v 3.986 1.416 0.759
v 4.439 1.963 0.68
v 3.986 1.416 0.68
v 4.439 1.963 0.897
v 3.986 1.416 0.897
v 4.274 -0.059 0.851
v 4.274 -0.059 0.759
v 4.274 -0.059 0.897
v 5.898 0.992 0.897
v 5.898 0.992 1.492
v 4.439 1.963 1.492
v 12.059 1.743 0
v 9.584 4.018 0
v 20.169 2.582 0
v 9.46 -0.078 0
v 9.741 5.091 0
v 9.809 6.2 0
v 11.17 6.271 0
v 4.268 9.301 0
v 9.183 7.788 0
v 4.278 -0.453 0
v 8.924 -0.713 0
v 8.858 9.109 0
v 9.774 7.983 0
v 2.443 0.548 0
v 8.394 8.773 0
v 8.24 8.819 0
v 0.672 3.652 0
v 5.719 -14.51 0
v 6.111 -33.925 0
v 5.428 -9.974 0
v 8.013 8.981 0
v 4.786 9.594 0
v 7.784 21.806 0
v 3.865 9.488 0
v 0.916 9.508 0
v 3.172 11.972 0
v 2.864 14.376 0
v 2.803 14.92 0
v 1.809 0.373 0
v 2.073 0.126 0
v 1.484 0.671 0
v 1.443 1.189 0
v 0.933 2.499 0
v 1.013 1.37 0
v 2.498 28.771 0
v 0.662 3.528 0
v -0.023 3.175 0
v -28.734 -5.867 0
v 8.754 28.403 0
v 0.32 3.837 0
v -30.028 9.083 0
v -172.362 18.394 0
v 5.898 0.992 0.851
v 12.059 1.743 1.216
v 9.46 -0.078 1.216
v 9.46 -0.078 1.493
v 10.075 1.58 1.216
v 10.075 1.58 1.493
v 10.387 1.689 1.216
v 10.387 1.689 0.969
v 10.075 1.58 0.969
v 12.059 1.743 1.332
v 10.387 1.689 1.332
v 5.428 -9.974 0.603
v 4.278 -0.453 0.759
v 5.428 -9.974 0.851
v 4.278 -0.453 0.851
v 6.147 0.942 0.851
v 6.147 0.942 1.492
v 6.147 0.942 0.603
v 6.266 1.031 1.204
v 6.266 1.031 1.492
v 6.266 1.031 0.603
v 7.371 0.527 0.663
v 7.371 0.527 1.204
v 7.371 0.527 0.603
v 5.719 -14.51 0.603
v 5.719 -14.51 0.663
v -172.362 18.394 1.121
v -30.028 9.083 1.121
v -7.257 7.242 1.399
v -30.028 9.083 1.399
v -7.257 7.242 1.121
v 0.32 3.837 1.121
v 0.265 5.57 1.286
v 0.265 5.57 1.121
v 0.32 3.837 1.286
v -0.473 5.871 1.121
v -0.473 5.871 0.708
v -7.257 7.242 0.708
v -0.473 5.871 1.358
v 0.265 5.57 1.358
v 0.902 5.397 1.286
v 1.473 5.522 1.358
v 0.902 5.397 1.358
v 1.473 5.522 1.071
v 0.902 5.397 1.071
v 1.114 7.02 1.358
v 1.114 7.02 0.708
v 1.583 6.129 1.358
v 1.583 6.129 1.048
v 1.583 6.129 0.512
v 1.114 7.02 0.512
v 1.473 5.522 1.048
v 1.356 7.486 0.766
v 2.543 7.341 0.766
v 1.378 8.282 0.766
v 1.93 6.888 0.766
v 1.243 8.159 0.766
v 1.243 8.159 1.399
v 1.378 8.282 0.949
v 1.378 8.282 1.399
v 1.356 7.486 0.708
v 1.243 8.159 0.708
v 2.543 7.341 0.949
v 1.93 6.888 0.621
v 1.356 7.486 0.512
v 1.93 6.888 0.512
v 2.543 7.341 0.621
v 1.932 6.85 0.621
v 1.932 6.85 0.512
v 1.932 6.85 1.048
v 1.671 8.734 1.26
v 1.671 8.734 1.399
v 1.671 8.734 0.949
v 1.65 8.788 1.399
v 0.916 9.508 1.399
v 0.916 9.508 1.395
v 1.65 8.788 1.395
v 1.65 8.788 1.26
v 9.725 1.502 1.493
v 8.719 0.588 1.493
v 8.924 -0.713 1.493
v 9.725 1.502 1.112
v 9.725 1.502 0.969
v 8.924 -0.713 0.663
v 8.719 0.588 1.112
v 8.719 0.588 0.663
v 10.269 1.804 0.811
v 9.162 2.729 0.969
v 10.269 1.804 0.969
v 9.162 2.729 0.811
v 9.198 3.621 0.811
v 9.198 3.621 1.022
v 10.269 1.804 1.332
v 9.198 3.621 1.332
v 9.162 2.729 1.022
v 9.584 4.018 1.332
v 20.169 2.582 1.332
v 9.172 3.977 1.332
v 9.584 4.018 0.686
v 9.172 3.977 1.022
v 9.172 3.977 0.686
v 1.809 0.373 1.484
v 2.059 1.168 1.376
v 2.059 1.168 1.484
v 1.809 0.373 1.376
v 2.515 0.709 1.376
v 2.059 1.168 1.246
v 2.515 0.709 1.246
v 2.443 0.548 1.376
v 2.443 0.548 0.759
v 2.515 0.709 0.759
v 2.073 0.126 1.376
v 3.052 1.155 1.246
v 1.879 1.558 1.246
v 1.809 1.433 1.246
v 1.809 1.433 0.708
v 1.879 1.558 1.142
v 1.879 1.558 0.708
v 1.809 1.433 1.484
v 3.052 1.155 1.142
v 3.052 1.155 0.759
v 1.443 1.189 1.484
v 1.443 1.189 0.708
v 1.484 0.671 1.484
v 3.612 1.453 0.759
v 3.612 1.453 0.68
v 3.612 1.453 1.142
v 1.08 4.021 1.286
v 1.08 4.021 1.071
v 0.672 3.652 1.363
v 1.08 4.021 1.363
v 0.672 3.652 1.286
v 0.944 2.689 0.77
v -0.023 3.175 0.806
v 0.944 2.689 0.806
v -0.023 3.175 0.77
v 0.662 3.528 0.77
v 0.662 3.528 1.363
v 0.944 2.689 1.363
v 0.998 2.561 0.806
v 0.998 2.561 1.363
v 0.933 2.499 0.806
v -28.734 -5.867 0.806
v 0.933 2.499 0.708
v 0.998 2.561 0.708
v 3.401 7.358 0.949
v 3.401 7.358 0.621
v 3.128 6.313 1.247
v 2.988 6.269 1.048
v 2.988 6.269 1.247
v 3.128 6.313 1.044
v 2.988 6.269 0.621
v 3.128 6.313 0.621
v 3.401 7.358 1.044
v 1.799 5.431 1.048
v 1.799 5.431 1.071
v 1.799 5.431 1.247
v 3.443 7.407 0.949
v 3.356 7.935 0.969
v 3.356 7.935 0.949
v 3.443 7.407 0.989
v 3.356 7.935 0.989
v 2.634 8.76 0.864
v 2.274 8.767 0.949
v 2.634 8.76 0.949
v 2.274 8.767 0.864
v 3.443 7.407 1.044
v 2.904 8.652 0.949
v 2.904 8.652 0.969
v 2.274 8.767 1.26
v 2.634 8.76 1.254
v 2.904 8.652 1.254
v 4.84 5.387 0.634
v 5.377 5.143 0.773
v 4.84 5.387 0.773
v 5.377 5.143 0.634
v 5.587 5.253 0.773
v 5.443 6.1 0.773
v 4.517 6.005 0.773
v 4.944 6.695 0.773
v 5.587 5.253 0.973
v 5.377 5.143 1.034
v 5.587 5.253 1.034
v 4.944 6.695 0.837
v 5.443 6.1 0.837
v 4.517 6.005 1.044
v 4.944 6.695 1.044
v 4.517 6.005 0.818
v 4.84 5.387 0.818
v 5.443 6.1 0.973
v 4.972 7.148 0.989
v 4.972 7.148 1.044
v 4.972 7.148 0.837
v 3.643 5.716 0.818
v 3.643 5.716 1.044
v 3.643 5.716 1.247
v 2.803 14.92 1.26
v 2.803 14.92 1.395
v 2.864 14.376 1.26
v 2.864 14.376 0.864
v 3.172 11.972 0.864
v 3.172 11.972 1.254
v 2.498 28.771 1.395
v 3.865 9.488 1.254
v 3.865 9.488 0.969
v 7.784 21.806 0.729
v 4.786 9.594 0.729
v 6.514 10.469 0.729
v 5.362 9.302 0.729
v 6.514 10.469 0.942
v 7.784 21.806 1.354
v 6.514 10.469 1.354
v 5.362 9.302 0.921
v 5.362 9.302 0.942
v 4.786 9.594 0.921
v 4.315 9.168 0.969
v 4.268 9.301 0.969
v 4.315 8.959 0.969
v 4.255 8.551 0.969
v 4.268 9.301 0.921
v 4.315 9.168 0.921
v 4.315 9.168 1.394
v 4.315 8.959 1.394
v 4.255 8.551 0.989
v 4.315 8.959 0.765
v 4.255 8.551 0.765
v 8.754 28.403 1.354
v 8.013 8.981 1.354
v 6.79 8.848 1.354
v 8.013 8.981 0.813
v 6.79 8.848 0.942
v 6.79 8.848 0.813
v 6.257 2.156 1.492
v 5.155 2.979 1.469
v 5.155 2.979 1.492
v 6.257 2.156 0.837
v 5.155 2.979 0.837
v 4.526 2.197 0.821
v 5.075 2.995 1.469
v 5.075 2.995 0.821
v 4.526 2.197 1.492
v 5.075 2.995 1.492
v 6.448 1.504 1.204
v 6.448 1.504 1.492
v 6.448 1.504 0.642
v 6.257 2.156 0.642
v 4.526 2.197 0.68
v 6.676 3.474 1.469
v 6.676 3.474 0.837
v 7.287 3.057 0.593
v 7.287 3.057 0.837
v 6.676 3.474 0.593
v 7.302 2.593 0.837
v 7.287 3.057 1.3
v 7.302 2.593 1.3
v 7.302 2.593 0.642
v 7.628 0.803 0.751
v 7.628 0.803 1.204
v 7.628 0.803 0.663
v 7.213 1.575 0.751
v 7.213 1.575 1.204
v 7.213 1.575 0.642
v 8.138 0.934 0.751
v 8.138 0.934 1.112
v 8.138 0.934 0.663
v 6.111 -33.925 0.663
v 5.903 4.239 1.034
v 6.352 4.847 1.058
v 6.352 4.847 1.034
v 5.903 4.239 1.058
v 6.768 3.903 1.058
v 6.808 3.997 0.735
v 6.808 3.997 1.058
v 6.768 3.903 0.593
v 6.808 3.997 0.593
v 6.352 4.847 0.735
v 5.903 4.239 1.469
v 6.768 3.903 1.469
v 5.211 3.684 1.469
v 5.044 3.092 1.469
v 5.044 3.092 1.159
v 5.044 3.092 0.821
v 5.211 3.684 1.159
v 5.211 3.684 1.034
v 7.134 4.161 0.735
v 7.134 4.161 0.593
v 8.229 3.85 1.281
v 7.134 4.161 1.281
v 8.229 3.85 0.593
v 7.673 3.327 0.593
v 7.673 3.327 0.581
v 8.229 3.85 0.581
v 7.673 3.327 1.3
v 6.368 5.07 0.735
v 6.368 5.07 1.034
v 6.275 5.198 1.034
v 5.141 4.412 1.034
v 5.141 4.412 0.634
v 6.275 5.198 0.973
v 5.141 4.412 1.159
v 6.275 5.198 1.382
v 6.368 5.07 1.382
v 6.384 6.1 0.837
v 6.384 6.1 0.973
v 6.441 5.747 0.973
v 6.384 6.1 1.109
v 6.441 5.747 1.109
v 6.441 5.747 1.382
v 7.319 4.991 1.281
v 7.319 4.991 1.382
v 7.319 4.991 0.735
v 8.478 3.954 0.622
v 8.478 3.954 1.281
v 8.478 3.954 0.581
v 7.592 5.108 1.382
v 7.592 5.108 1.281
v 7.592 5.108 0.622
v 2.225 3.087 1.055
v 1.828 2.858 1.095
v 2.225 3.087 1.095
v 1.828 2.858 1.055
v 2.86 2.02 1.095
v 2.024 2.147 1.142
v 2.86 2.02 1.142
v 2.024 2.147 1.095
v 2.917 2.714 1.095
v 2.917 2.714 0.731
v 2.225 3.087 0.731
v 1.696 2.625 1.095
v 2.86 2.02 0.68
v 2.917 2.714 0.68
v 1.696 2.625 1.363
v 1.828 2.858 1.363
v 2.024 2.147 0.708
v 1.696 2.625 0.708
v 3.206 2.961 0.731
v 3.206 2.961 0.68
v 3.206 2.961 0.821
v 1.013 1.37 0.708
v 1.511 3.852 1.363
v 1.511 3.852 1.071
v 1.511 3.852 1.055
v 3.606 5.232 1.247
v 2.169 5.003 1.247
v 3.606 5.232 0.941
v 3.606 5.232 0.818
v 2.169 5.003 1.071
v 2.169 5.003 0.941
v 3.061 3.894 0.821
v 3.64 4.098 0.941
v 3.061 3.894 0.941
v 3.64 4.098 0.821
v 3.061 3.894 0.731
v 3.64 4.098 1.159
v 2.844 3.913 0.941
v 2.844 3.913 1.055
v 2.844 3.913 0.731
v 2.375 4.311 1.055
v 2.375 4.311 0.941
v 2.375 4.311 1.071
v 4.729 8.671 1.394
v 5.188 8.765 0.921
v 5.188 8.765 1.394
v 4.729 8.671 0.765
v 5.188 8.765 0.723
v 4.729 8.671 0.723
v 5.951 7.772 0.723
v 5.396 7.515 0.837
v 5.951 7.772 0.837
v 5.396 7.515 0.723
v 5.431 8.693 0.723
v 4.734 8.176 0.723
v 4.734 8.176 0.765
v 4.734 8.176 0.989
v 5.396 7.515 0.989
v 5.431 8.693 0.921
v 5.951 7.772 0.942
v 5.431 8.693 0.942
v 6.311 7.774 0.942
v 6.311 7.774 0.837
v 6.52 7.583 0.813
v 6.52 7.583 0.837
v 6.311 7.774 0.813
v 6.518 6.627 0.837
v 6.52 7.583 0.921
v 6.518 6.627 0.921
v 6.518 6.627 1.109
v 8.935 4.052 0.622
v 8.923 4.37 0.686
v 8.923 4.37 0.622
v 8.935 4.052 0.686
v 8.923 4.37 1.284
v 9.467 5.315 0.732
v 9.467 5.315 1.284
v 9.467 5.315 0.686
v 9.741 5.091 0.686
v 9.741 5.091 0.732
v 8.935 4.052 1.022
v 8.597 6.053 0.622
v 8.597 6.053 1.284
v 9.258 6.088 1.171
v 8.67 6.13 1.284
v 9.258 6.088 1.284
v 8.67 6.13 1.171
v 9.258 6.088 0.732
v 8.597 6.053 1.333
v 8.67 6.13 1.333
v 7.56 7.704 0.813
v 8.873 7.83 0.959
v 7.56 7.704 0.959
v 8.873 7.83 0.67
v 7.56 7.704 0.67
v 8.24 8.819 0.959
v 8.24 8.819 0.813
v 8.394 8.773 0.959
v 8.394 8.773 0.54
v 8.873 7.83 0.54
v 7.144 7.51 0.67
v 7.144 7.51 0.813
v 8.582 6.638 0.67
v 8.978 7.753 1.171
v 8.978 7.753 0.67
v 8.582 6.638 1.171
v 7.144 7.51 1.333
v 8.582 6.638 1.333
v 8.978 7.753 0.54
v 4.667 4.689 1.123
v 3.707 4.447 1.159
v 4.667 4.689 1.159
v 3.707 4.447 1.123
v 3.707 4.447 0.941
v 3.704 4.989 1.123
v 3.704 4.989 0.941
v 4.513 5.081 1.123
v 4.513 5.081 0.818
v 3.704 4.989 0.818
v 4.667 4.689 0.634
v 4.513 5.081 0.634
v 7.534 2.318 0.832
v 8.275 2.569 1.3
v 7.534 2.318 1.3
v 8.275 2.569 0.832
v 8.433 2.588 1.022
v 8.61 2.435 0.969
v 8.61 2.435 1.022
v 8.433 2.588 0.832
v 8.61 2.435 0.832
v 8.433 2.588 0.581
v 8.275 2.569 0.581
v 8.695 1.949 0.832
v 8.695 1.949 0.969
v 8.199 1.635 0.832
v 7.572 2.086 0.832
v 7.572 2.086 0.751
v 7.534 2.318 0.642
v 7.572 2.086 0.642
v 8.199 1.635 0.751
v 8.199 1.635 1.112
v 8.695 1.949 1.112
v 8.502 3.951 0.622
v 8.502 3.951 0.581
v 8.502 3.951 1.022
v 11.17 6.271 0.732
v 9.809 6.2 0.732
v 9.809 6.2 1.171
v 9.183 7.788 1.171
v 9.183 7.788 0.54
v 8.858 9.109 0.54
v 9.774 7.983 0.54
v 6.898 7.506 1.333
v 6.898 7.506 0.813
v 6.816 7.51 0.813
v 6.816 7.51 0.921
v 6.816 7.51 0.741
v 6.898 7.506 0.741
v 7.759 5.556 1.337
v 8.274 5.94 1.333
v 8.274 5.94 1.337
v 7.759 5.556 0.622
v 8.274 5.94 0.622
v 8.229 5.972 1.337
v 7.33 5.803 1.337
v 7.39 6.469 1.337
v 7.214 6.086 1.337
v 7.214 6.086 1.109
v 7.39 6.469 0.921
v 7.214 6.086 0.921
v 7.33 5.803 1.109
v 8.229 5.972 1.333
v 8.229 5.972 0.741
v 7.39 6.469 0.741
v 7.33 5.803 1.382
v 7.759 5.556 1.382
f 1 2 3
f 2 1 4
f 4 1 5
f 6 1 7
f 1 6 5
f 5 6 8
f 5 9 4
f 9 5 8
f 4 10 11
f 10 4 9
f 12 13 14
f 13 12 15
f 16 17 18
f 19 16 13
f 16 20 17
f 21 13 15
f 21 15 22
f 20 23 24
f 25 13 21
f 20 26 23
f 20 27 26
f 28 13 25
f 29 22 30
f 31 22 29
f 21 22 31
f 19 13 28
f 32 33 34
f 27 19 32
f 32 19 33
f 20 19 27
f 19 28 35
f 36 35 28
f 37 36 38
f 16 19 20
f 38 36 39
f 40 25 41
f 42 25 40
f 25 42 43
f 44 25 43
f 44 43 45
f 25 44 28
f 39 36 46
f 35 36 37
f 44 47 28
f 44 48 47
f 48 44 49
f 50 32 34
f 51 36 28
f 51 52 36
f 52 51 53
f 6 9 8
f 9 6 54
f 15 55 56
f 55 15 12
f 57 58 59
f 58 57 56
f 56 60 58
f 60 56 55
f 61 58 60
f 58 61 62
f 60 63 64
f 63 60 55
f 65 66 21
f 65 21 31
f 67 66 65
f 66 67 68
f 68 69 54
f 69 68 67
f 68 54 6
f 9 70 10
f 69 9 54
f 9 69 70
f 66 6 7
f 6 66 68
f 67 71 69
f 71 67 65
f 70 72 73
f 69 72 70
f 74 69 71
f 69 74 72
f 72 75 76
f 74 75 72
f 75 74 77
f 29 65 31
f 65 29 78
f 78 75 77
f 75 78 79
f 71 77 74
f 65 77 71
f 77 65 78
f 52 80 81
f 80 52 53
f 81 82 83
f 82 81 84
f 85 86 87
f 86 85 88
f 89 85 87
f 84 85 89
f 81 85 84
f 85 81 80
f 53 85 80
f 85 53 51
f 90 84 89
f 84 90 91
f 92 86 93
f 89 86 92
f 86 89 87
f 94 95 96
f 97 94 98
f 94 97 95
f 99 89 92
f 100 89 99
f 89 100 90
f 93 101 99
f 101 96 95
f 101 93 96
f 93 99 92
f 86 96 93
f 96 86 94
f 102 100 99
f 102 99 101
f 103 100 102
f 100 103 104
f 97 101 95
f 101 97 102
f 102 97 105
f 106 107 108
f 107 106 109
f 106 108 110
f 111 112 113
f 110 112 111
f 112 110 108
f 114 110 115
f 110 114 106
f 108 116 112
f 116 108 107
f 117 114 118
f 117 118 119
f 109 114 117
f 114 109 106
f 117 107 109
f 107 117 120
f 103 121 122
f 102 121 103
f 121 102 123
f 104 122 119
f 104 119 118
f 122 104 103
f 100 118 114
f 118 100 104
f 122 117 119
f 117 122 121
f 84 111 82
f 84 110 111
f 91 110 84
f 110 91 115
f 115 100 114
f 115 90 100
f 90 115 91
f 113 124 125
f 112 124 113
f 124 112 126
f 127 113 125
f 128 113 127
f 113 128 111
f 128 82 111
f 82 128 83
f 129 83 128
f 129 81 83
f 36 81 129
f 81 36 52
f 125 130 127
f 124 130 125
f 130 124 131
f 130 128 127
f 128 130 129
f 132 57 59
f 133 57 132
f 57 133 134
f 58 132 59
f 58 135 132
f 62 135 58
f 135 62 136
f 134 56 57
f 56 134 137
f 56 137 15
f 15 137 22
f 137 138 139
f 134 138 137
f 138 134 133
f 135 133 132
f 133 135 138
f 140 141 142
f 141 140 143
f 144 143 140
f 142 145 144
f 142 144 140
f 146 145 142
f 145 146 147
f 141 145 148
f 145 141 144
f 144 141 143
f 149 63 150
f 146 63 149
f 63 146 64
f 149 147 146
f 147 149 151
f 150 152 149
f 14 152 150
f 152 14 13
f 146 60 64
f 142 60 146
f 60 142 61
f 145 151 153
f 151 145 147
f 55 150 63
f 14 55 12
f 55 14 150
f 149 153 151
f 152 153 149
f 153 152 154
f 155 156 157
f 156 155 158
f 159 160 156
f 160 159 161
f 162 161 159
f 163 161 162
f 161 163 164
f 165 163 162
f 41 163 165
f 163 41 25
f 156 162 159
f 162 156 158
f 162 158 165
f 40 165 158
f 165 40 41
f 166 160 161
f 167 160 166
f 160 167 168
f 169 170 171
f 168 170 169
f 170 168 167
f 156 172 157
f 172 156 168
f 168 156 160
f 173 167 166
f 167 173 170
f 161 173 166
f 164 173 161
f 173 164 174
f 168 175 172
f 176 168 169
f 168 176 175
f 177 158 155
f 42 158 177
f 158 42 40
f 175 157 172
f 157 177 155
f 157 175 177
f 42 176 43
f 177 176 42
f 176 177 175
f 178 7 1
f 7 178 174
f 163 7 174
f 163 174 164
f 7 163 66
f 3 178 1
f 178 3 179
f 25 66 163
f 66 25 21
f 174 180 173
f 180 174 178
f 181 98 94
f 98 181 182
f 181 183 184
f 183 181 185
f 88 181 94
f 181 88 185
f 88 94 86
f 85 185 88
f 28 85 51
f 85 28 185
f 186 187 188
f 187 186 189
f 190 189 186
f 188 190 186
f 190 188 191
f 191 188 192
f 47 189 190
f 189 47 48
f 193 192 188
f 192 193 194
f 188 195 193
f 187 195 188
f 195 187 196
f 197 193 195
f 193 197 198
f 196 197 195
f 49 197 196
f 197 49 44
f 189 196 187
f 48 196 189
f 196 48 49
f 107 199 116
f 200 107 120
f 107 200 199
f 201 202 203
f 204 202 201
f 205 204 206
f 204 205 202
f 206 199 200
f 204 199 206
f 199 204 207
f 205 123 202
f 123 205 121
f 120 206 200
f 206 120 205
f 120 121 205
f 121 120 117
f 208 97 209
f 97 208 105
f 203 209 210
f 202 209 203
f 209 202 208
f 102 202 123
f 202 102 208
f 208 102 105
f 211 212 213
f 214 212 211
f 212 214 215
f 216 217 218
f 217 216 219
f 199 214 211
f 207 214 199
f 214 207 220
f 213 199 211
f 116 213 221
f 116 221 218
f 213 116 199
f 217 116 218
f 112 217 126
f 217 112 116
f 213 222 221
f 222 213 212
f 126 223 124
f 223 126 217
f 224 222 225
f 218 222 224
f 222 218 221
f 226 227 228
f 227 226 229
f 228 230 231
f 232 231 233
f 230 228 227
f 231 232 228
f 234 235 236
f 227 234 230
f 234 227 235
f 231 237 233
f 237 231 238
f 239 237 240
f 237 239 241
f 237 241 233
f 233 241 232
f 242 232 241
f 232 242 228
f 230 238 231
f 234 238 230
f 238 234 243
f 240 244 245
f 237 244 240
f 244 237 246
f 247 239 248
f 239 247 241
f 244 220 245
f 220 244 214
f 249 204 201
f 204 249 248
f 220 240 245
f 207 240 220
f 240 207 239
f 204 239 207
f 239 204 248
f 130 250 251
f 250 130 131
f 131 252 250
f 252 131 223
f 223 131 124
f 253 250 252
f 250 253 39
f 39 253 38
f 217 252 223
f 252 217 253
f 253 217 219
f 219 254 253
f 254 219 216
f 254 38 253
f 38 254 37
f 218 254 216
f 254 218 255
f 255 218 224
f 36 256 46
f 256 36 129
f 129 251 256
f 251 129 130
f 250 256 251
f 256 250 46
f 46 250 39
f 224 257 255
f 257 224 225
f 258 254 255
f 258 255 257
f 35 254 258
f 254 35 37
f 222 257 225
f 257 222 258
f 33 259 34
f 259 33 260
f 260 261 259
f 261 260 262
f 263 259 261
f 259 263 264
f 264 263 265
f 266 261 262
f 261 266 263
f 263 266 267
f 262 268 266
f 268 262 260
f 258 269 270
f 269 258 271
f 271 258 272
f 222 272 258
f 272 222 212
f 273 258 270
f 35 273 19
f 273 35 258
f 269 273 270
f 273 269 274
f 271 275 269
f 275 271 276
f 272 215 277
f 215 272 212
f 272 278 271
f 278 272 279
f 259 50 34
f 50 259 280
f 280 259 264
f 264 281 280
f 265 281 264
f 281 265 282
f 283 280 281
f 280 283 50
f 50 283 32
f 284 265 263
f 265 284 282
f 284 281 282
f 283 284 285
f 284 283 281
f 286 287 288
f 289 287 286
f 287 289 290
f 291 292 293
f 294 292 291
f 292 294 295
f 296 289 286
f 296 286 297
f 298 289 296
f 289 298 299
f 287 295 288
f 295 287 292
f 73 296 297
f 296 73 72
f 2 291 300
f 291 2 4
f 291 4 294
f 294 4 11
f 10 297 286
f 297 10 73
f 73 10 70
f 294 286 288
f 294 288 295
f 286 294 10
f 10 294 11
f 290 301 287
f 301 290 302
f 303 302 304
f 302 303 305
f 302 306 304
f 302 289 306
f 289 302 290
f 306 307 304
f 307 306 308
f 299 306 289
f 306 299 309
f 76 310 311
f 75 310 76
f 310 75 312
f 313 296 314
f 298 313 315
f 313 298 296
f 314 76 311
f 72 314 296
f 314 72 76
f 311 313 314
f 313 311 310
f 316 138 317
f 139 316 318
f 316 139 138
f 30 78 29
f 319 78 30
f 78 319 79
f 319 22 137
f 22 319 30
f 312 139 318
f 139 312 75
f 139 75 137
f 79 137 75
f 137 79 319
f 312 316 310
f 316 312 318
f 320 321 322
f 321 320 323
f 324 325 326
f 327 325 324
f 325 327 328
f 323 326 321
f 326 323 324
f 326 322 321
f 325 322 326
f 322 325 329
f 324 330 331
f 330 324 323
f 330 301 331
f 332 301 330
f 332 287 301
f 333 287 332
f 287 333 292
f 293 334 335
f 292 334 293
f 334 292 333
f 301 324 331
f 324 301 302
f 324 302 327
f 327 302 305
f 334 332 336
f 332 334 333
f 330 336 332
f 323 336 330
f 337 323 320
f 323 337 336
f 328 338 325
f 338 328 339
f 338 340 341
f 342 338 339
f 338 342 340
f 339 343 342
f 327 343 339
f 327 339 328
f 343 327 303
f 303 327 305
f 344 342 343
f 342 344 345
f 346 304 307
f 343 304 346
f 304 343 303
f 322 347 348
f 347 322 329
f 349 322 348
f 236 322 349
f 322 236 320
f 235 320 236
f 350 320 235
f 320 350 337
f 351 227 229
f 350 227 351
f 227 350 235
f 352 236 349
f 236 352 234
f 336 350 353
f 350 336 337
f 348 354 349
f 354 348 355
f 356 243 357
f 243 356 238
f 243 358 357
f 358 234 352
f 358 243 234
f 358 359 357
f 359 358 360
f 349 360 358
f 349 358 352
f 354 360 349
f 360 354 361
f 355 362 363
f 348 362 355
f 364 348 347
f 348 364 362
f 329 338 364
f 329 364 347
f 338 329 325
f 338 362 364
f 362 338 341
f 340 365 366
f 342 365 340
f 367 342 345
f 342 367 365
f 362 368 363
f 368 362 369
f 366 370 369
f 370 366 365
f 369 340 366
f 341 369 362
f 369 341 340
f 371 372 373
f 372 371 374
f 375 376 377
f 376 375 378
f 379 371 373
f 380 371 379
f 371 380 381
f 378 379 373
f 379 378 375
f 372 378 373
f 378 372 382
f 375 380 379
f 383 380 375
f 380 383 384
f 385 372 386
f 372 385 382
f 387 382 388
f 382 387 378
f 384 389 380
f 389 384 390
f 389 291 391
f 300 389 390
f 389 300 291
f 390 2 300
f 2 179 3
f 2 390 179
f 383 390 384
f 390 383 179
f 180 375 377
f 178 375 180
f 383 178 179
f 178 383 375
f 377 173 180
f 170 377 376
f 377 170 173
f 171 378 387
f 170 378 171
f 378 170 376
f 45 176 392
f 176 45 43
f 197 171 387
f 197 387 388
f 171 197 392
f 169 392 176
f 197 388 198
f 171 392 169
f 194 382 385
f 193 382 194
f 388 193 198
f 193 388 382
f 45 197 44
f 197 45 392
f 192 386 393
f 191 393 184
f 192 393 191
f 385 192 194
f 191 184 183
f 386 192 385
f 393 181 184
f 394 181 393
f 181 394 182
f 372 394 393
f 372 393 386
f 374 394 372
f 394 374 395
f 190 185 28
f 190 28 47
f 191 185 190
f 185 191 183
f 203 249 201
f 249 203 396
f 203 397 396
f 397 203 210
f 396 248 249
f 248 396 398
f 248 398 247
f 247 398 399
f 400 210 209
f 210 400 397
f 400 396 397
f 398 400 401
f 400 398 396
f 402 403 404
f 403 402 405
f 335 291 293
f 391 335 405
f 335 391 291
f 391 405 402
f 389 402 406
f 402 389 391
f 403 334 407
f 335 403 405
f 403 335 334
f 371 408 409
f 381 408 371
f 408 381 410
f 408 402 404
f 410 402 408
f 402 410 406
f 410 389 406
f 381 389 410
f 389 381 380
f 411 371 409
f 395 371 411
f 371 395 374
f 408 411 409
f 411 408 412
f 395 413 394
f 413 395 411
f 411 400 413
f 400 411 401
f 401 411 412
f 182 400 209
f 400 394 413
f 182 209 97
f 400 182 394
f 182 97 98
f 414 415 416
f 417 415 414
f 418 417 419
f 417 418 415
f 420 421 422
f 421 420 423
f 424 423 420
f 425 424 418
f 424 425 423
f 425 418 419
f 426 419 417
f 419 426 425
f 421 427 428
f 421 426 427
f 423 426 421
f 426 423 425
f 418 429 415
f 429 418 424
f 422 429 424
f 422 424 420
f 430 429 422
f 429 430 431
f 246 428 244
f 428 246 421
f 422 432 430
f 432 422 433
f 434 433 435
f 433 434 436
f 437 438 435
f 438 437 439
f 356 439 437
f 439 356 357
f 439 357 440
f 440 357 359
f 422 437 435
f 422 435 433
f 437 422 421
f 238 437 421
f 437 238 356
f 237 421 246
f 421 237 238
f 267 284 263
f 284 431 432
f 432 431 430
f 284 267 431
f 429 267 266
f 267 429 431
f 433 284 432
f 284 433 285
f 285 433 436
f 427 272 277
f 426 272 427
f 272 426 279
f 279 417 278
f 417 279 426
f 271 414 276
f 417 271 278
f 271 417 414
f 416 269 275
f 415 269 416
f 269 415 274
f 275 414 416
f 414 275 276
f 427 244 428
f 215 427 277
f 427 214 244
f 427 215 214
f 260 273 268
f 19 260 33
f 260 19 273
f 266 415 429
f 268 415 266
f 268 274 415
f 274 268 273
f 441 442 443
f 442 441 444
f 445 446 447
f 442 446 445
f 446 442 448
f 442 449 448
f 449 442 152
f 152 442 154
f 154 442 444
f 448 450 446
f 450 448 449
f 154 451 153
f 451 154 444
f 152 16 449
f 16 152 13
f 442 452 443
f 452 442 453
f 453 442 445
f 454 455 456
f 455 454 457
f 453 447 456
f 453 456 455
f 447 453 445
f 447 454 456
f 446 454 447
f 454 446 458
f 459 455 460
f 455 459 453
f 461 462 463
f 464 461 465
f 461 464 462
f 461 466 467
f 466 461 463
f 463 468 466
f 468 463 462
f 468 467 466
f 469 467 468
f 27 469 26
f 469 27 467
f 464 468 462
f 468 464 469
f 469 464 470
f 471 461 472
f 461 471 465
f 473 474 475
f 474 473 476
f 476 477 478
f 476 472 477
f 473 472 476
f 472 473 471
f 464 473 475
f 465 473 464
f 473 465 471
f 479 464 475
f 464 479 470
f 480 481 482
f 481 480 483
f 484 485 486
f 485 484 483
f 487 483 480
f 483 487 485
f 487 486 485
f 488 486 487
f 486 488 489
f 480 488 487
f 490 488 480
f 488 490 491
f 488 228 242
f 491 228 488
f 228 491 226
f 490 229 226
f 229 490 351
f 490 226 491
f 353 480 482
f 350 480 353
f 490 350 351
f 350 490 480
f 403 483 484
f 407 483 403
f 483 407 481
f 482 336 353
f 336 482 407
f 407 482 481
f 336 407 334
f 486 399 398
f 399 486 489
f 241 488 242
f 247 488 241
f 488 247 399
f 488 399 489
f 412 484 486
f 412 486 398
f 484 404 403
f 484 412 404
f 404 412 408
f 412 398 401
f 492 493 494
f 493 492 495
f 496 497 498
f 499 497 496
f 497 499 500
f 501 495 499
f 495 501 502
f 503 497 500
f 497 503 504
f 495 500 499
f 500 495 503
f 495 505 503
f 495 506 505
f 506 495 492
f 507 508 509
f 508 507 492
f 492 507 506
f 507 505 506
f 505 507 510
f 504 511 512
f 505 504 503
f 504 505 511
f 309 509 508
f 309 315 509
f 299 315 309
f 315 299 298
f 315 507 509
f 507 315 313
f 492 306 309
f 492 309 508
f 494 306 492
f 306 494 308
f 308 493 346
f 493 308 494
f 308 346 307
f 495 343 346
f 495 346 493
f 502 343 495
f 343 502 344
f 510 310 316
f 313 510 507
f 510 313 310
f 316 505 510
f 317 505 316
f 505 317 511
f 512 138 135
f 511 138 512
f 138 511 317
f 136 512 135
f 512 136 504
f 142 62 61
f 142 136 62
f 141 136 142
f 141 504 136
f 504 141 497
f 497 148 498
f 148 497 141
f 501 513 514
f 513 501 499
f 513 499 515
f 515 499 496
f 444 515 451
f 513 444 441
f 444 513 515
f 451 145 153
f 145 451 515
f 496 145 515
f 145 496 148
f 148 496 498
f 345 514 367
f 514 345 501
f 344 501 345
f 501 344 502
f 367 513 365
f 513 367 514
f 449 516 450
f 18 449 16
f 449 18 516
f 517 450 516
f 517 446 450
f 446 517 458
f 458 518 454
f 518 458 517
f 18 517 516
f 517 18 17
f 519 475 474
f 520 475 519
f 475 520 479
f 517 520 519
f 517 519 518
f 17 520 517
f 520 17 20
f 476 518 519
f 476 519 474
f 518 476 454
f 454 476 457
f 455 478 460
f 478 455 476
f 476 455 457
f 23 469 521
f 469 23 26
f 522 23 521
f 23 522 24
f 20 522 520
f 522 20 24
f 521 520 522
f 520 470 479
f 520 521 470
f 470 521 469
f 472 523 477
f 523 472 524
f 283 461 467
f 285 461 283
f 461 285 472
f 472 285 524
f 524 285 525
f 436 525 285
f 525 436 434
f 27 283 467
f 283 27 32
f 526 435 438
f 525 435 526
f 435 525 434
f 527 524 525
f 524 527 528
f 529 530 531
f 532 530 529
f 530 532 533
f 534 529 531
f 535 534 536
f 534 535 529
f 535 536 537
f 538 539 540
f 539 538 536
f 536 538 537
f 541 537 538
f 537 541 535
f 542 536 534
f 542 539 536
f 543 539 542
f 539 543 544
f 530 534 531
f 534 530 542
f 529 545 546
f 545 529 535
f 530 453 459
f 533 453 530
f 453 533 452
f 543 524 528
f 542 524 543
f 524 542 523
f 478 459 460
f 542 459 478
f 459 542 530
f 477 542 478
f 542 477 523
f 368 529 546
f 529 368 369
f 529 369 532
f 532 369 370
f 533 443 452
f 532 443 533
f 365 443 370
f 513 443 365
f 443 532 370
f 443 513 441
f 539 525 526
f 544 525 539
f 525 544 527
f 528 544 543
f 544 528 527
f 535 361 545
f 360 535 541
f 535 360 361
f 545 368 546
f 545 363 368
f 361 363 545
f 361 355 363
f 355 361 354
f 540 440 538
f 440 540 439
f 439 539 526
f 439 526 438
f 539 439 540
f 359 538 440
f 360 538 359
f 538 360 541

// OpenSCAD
union() {
	linear_extrude(height = 0.8968151095) {
		polygon(points = [[3.985586373024085, 1.4163151264697034], [4.274279786508919, -0.058723176604262683], [5.8983752412357555, 0.9915415721388465], [4.438714341742451, 1.9626676269784178]]);
	}
	linear_extrude(height = 1.2155783643) {
		polygon(points = [[10.07504885882976, 1.5802160185728964], [9.459696021651917, -0.07798118572829077], [12.05920443111194, 1.7427390520267876], [10.38734496603068, 1.6892251850085935]]);
	}
	linear_extrude(height = 0.8508772328) {
		polygon(points = [[5.427728754618061, -9.97374363284219], [6.147492825484421, 0.9422705349368847], [5.8983752412357555, 0.9915415721388465], [4.274279786508919, -0.058723176604262683], [4.278100418286609, -0.4529141704763394]]);
	}
	linear_extrude(height = 0.6027336539) {
		polygon(points = [[5.718782145155748, -14.510452668979248], [7.370952987486774, 0.5270723837673056], [6.265765366333088, 1.0312484341898904], [6.147492825484421, 0.9422705349368847], [5.427728754618061, -9.97374363284219]]);
	}
	linear_extrude(height = 1.1205449402) {
		polygon(points = [[0.31971272393050154, 3.8370299792580944], [-172.3616164803935, 18.394092220168172], [-30.028162021194234, 9.082612951598495], [-7.256982238586573, 7.241663410220105], [-0.4725998384002328, 5.871143758927959], [0.265324506229122, 5.5701153754826285]]);
	}
	linear_extrude(height = 1.3583904662) {
		polygon(points = [[1.5833853917610652, 6.128834192047368], [1.1144483270527592, 7.020440226254804], [-0.4725998384002328, 5.871143758927959], [0.265324506229122, 5.5701153754826285], [0.9022947541965005, 5.396696343107139], [1.4732533312350222, 5.522351645089202]]);
	}
	linear_extrude(height = 0.7663050325) {
		polygon(points = [[1.3780773073333483, 8.28202758125457], [2.5431925395294344, 7.340818093658286], [1.9296131434283663, 6.888058073493114], [1.3556152153688932, 7.486383313531218], [1.243266905852212, 8.158869924753068]]);
	}
	linear_extrude(height = 0.5121932068) {
		polygon(points = [[1.3556152153688932, 7.486383313531218], [1.1144483270527592, 7.020440226254804], [1.5833853917610652, 6.128834192047368], [1.9324576998363052, 6.849973862188225], [1.9296131434283663, 6.888058073493114]]);
	}
	linear_extrude(height = 0.7077276327) {
		polygon(points = [[1.243266905852212, 8.158869924753068], [-7.256982238586573, 7.241663410220105], [-0.4725998384002328, 5.871143758927959], [1.1144483270527592, 7.020440226254804], [1.3556152153688932, 7.486383313531218]]);
	}
	linear_extrude(height = 1.3994954693) {
		polygon(points = [[1.3780773073333483, 8.28202758125457], [1.671240417110901, 8.733681626272846], [1.6499603741663922, 8.787982749607217], [0.9161551628357208, 9.508070900676746], [-30.028162021194234, 9.082612951598495], [-7.256982238586573, 7.241663410220105], [1.243266905852212, 8.158869924753068]]);
	}
	linear_extrude(height = 1.4927776731) {
		polygon(points = [[9.72469964757405, 1.5018437601002252], [10.07504885882976, 1.5802160185728964], [9.459696021651917, -0.07798118572829077], [8.924238109176287, -0.7130164339888028], [8.719010480626224, 0.5875341516711872]]);
	}
	linear_extrude(height = 0.8105550625) {
		polygon(points = [[10.268617986667724, 1.8043754791808655], [9.198079960244527, 3.6214016987059208], [9.161927699670002, 2.7291942580444974]]);
	}
	linear_extrude(height = 1.3323834695) {
		polygon(points = [[10.268617986667724, 1.8043754791808655], [10.38734496603068, 1.6892251850085935], [12.05920443111194, 1.7427390520267876], [20.168784141537905, 2.581969333811275], [9.58386207224574, 4.01798780551257], [9.171512558102354, 3.9774851898049963], [9.198079960244527, 3.6214016987059208]]);
	}
	linear_extrude(height = 1.3756654530) {
		polygon(points = [[2.0729496767641677, 0.1260455051231717], [2.443175559116163, 0.5479192730287048], [2.515109862821819, 0.7087968714433343], [2.058802222231333, 1.1683611634287034], [1.8094804518223118, 0.3732863537694361]]);
	}
	linear_extrude(height = 1.2456782665) {
		polygon(points = [[2.515109862821819, 0.7087968714433343], [3.051734505128176, 1.155356260762312], [1.8794863177517176, 1.5578603637309678], [1.8092069535205244, 1.4329174884328537], [2.058802222231333, 1.1683611634287034]]);
	}
	linear_extrude(height = 1.4843748995) {
		polygon(points = [[1.8094804518223118, 0.3732863537694361], [1.4835821429682132, 0.6710452812645262], [1.4430725689458008, 1.1889178382920385], [1.8092069535205244, 1.4329174884328537], [2.058802222231333, 1.1683611634287034]]);
	}
	linear_extrude(height = 0.7587355890) {
		polygon(points = [[2.443175559116163, 0.5479192730287048], [4.278100418286609, -0.4529141704763394], [4.274279786508919, -0.058723176604262683], [3.985586373024085, 1.4163151264697034], [3.6123615769465585, 1.452568499040009], [3.051734505128176, 1.155356260762312], [2.515109862821819, 0.7087968714433343]]);
	}
	linear_extrude(height = 1.2855172319) {
		polygon(points = [[0.6719073491051809, 3.652440241774017], [0.31971272393050154, 3.8370299792580944], [0.265324506229122, 5.5701153754826285], [0.9022947541965005, 5.396696343107139], [1.0797798668657808, 4.02085099696415]]);
	}
	linear_extrude(height = 0.7696527027) {
		polygon(points = [[0.9437707321038176, 2.6894828721669333], [-0.023510257225709597, 3.1754759746898857], [0.6618094970964926, 3.5282332194263497]]);
	}
	linear_extrude(height = 0.8060653080) {
		polygon(points = [[0.9437707321038176, 2.6894828721669333], [-0.023510257225709597, 3.1754759746898857], [-28.733543619498313, -5.867266612725254], [0.9325327520467876, 2.4993599833470364], [0.9976870492585823, 2.5611628115060494]]);
	}
	linear_extrude(height = 0.6207768780) {
		polygon(points = [[2.98822850740503, 6.268760463249246], [1.9324576998363052, 6.849973862188225], [1.9296131434283663, 6.888058073493114], [2.5431925395294344, 7.340818093658286], [3.4006998984973107, 7.357641729327988], [3.1278165798235373, 6.312545116254032]]);
	}
	linear_extrude(height = 1.0480736607) {
		polygon(points = [[1.79895167118293, 5.4310665522083275], [1.4732533312350222, 5.522351645089202], [1.5833853917610652, 6.128834192047368], [1.9324576998363052, 6.849973862188225], [2.98822850740503, 6.268760463249246]]);
	}
	linear_extrude(height = 0.9490486003) {
		polygon(points = [[2.903868640597936, 8.652359333947116], [3.355889367932589, 7.934654383466208], [3.442893329245981, 7.406946317922963], [3.4006998984973107, 7.357641729327988], [2.5431925395294344, 7.340818093658286], [1.3780773073333483, 8.28202758125457], [1.671240417110901, 8.733681626272846], [2.2740091875728012, 8.767177015916074], [2.634341994699485, 8.760198821522048]]);
	}
	linear_extrude(height = 0.7732681527) {
		polygon(points = [[5.377005053064787, 5.1425315869597945], [4.839692590092332, 5.387492385479905], [4.517480230062006, 6.0054587782966635], [4.943818939711366, 6.695458931287805], [5.4430327410227015, 6.0998526458183955], [5.586812071402414, 5.253116730451409]]);
	}
	linear_extrude(height = 1.0443645591) {
		polygon(points = [[4.517480230062006, 6.0054587782966635], [3.643487884088852, 5.71632730320535], [3.1278165798235373, 6.312545116254032], [3.4006998984973107, 7.357641729327988], [3.442893329245981, 7.406946317922963], [4.972050143547886, 7.147872723205399], [4.943818939711366, 6.695458931287805]]);
	}
	linear_extrude(height = 1.2599519824) {
		polygon(points = [[2.8031707729035595, 14.920481757914315], [1.6499603741663922, 8.787982749607217], [1.671240417110901, 8.733681626272846], [2.2740091875728012, 8.767177015916074], [2.864356156643158, 14.375686683420733]]);
	}
	linear_extrude(height = 0.8638933396) {
		polygon(points = [[3.1717716393011974, 11.971837810122786], [2.634341994699485, 8.760198821522048], [2.2740091875728012, 8.767177015916074], [2.864356156643158, 14.375686683420733]]);
	}
	linear_extrude(height = 1.3948259450) {
		polygon(points = [[2.4981716842682897, 28.77053805410827], [0.9161551628357208, 9.508070900676746], [1.6499603741663922, 8.787982749607217], [2.8031707729035595, 14.920481757914315]]);
	}
	linear_extrude(height = 1.2537464731) {
		polygon(points = [[3.8653254427996835, 9.488132719685355], [2.903868640597936, 8.652359333947116], [2.634341994699485, 8.760198821522048], [3.1717716393011974, 11.971837810122786]]);
	}
	linear_extrude(height = 0.7287858623) {
		polygon(points = [[7.784436561133984, 21.80617382406902], [6.513809685581561, 10.468700675255116], [5.362496934605142, 9.302233058661269], [4.786012156857318, 9.594188145639242]]);
	}
	linear_extrude(height = 0.9689640220) {
		polygon(points = [[3.8653254427996835, 9.488132719685355], [2.903868640597936, 8.652359333947116], [3.355889367932589, 7.934654383466208], [4.255042325774518, 8.550566714314456], [4.315281151066439, 8.95912037527911], [4.314674365178304, 9.168168599958815], [4.2680365127245485, 9.301355625411553]]);
	}
	linear_extrude(height = 1.3543158890) {
		polygon(points = [[8.754123369374469, 28.40298069098858], [8.012624913158977, 8.981102916556106], [6.7899731918956485, 8.847864083116853], [6.513809685581561, 10.468700675255116], [7.784436561133984, 21.80617382406902]]);
	}
	linear_extrude(height = 1.4922438971) {
		polygon(points = [[6.2566629280052934, 2.156222157975948], [5.155415968955214, 2.979079426241757], [5.075208833913641, 2.9948665729150497], [4.52573656285126, 2.19734209140037], [4.438714341742451, 1.9626676269784178], [5.8983752412357555, 0.9915415721388465], [6.147492825484421, 0.9422705349368847], [6.265765366333088, 1.0312484341898904], [6.448280652927108, 1.5043920110665687]]);
	}
	linear_extrude(height = 0.8366540050) {
		polygon(points = [[6.676449803797715, 3.4738269575846696], [5.155415968955214, 2.979079426241757], [6.2566629280052934, 2.156222157975948], [7.30163505766491, 2.5933482902722407], [7.287295208785353, 3.0566480838548062]]);
	}
	linear_extrude(height = 1.2037421221) {
		polygon(points = [[7.213141983106915, 1.5749975004112087], [6.448280652927108, 1.5043920110665687], [6.265765366333088, 1.0312484341898904], [7.370952987486774, 0.5270723837673056], [7.628245715789428, 0.8027379792219456]]);
	}
	linear_extrude(height = 0.6633075788) {
		polygon(points = [[8.13842979269645, 0.9342490038638787], [8.719010480626224, 0.5875341516711872], [8.924238109176287, -0.7130164339888028], [6.111212292540468, -33.924551552799926], [5.718782145155748, -14.510452668979248], [7.370952987486774, 0.5270723837673056], [7.628245715789428, 0.8027379792219456]]);
	}
	linear_extrude(height = 1.0576783978) {
		polygon(points = [[6.807653923517104, 3.996863679429482], [6.352262597163879, 4.846874497514511], [5.90348625592121, 4.239147561552863], [6.767987534904725, 3.902722132062408]]);
	}
	linear_extrude(height = 1.4687212973) {
		polygon(points = [[6.767987534904725, 3.902722132062408], [6.676449803797715, 3.4738269575846696], [5.155415968955214, 2.979079426241757], [5.075208833913641, 2.9948665729150497], [5.044049581764272, 3.0923854014973267], [5.211362954282152, 3.6842239484466908], [5.90348625592121, 4.239147561552863]]);
	}
	linear_extrude(height = 0.5928005961) {
		polygon(points = [[6.807653923517104, 3.996863679429482], [7.133698098364023, 4.160671207964781], [8.228864949270841, 3.8495632479881503], [7.6734585314556805, 3.3267304223448124], [7.287295208785353, 3.0566480838548062], [6.676449803797715, 3.4738269575846696], [6.767987534904725, 3.902722132062408]]);
	}
	linear_extrude(height = 1.0340147183) {
		polygon(points = [[6.3675813347073404, 5.070045723588043], [6.352262597163879, 4.846874497514511], [5.90348625592121, 4.239147561552863], [5.211362954282152, 3.6842239484466908], [5.140568378287376, 4.41164304152871], [5.377005053064787, 5.1425315869597945], [5.586812071402414, 5.253116730451409], [6.2753785150804635, 5.198253861570346]]);
	}
	linear_extrude(height = 0.9727014780) {
		polygon(points = [[6.441136421340248, 5.746978896450047], [6.384299952087201, 6.100146314630701], [5.4430327410227015, 6.0998526458183955], [5.586812071402414, 5.253116730451409], [6.2753785150804635, 5.198253861570346]]);
	}
	linear_extrude(height = 0.7352597477) {
		polygon(points = [[7.319466045582692, 4.991339841243219], [7.133698098364023, 4.160671207964781], [6.807653923517104, 3.996863679429482], [6.352262597163879, 4.846874497514511], [6.3675813347073404, 5.070045723588043]]);
	}
	linear_extrude(height = 1.2809993593) {
		polygon(points = [[7.592463884090238, 5.10790391416924], [8.47780595906569, 3.9537601954851347], [8.228864949270841, 3.8495632479881503], [7.133698098364023, 4.160671207964781], [7.319466045582692, 4.991339841243219]]);
	}
	linear_extrude(height = 1.0948457260) {
		polygon(points = [[1.8279859649702836, 2.857864885614844], [1.6963564827462712, 2.6254016818471944], [2.0238055284295826, 2.1468654086922423], [2.859987959570339, 2.0197168086643096], [2.916628958686509, 2.7143713225375863], [2.225181845442018, 3.0869774472686577]]);
	}
	linear_extrude(height = 0.6801660314) {
		polygon(points = [[2.916628958686509, 2.7143713225375863], [3.2059780236872437, 2.9611390852628143], [4.52573656285126, 2.19734209140037], [4.438714341742451, 1.9626676269784178], [3.985586373024085, 1.4163151264697034], [3.6123615769465585, 1.452568499040009], [2.859987959570339, 2.0197168086643096]]);
	}
	linear_extrude(height = 1.1419121458) {
		polygon(points = [[2.0238055284295826, 2.1468654086922423], [1.8794863177517176, 1.5578603637309678], [3.051734505128176, 1.155356260762312], [3.6123615769465585, 1.452568499040009], [2.859987959570339, 2.0197168086643096]]);
	}
	linear_extrude(height = 0.7078698953) {
		polygon(points = [[1.6963564827462712, 2.6254016818471944], [0.9976870492585823, 2.5611628115060494], [0.9325327520467876, 2.4993599833470364], [1.0125438002637317, 1.3696443826707605], [1.4430725689458008, 1.1889178382920385], [1.8092069535205244, 1.4329174884328537], [1.8794863177517176, 1.5578603637309678], [2.0238055284295826, 2.1468654086922423]]);
	}
	linear_extrude(height = 1.3631535616) {
		polygon(points = [[1.8279859649702836, 2.857864885614844], [1.5108616539078623, 3.851578962752627], [1.0797798668657808, 4.02085099696415], [0.6719073491051809, 3.652440241774017], [0.6618094970964926, 3.5282332194263497], [0.9437707321038176, 2.6894828721669333], [0.9976870492585823, 2.5611628115060494], [1.6963564827462712, 2.6254016818471944]]);
	}
	linear_extrude(height = 1.2466535944) {
		polygon(points = [[2.1694116557487515, 5.003015015288728], [1.79895167118293, 5.4310665522083275], [2.98822850740503, 6.268760463249246], [3.1278165798235373, 6.312545116254032], [3.643487884088852, 5.71632730320535], [3.6056767258282165, 5.232424069841203]]);
	}
	linear_extrude(height = 0.8205954540) {
		polygon(points = [[3.061319625750532, 3.894139119946398], [3.2059780236872437, 2.9611390852628143], [4.52573656285126, 2.19734209140037], [5.075208833913641, 2.9948665729150497], [5.044049581764272, 3.0923854014973267], [3.639845305129646, 4.098067164271942]]);
	}
	linear_extrude(height = 0.7313144932) {
		polygon(points = [[2.8436221072732955, 3.913391091089852], [2.225181845442018, 3.0869774472686577], [2.916628958686509, 2.7143713225375863], [3.2059780236872437, 2.9611390852628143], [3.061319625750532, 3.894139119946398]]);
	}
	linear_extrude(height = 1.0550005515) {
		polygon(points = [[2.3749614743314256, 4.311350531411304], [1.5108616539078623, 3.851578962752627], [1.8279859649702836, 2.857864885614844], [2.225181845442018, 3.0869774472686577], [2.8436221072732955, 3.913391091089852]]);
	}
	linear_extrude(height = 1.0708840767) {
		polygon(points = [[2.1694116557487515, 5.003015015288728], [1.79895167118293, 5.4310665522083275], [1.4732533312350222, 5.522351645089202], [0.9022947541965005, 5.396696343107139], [1.0797798668657808, 4.02085099696415], [1.5108616539078623, 3.851578962752627], [2.3749614743314256, 4.311350531411304]]);
	}
	linear_extrude(height = 0.7226581104) {
		polygon(points = [[5.188487466509908, 8.764949068049596], [4.729464602004699, 8.671080840290015], [4.734003359901868, 8.176490857144552], [5.395771829540217, 7.51494663133146], [5.951046118512783, 7.772173469338323], [5.431382378875997, 8.692680665106865]]);
	}
	linear_extrude(height = 0.8373067961) {
		polygon(points = [[5.395771829540217, 7.51494663133146], [4.972050143547886, 7.147872723205399], [4.943818939711366, 6.695458931287805], [5.4430327410227015, 6.0998526458183955], [6.384299952087201, 6.100146314630701], [6.518139045835942, 6.626953677977729], [6.520500742956351, 7.583338084947014], [6.311180995702708, 7.774052192137752], [5.951046118512783, 7.772173469338323]]);
	}
	linear_extrude(height = 0.9419366536) {
		polygon(points = [[5.431382378875997, 8.692680665106865], [5.362496934605142, 9.302233058661269], [6.513809685581561, 10.468700675255116], [6.7899731918956485, 8.847864083116853], [6.311180995702708, 7.774052192137752], [5.951046118512783, 7.772173469338323]]);
	}
	linear_extrude(height = 0.7649867044) {
		polygon(points = [[4.734003359901868, 8.176490857144552], [4.255042325774518, 8.550566714314456], [4.315281151066439, 8.95912037527911], [4.729464602004699, 8.671080840290015]]);
	}
	linear_extrude(height = 1.3941220481) {
		polygon(points = [[5.188487466509908, 8.764949068049596], [4.314674365178304, 9.168168599958815], [4.315281151066439, 8.95912037527911], [4.729464602004699, 8.671080840290015]]);
	}
	linear_extrude(height = 0.9892646633) {
		polygon(points = [[4.734003359901868, 8.176490857144552], [4.255042325774518, 8.550566714314456], [3.355889367932589, 7.934654383466208], [3.442893329245981, 7.406946317922963], [4.972050143547886, 7.147872723205399], [5.395771829540217, 7.51494663133146]]);
	}
	linear_extrude(height = 0.9205567465) {
		polygon(points = [[5.188487466509908, 8.764949068049596], [4.314674365178304, 9.168168599958815], [4.2680365127245485, 9.301355625411553], [4.786012156857318, 9.594188145639242], [5.362496934605142, 9.302233058661269], [5.431382378875997, 8.692680665106865]]);
	}
	linear_extrude(height = 0.6857903335) {
		polygon(points = [[9.466763623633597, 5.315276956605837], [8.923091685732098, 4.369688944027554], [8.935185798514265, 4.051981406033719], [9.171512558102354, 3.9774851898049963], [9.58386207224574, 4.01798780551257], [9.740557132701532, 5.091450051677282]]);
	}
	linear_extrude(height = 1.2844874514) {
		polygon(points = [[8.670393296314408, 6.1298575254345815], [9.25820984755304, 6.087639492602099], [9.466763623633597, 5.315276956605837], [8.923091685732098, 4.369688944027554], [8.59736091351144, 6.0532273617270755]]);
	}
	linear_extrude(height = 0.9593723810) {
		polygon(points = [[8.394386654853978, 8.773096387542916], [8.873234574003002, 7.830445509345957], [7.560415924733703, 7.703830091011053], [8.24001307152784, 8.818713545133486]]);
	}
	linear_extrude(height = 0.6701044588) {
		polygon(points = [[8.873234574003002, 7.830445509345957], [8.97833610370349, 7.753496623542178], [8.582136275058973, 6.638462447827329], [7.144063048297994, 7.509822113756026], [7.560415924733703, 7.703830091011053]]);
	}
	linear_extrude(height = 1.1231171235) {
		polygon(points = [[3.7035630195380684, 4.988935807859447], [4.512921744516688, 5.081215380503741], [4.667278411179735, 4.689070967889341], [3.7069116757060363, 4.446540985791138]]);
	}
	linear_extrude(height = 0.6343475461) {
		polygon(points = [[4.512921744516688, 5.081215380503741], [4.839692590092332, 5.387492385479905], [5.377005053064787, 5.1425315869597945], [5.140568378287376, 4.41164304152871], [4.667278411179735, 4.689070967889341]]);
	}
	linear_extrude(height = 1.1591998317) {
		polygon(points = [[3.7069116757060363, 4.446540985791138], [3.639845305129646, 4.098067164271942], [5.044049581764272, 3.0923854014973267], [5.211362954282152, 3.6842239484466908], [5.140568378287376, 4.41164304152871], [4.667278411179735, 4.689070967889341]]);
	}
	linear_extrude(height = 0.8177703566) {
		polygon(points = [[3.7035630195380684, 4.988935807859447], [3.6056767258282165, 5.232424069841203], [3.643487884088852, 5.71632730320535], [4.517480230062006, 6.0054587782966635], [4.839692590092332, 5.387492385479905], [4.512921744516688, 5.081215380503741]]);
	}
	linear_extrude(height = 0.9411553310) {
		polygon(points = [[3.7035630195380684, 4.988935807859447], [3.6056767258282165, 5.232424069841203], [2.1694116557487515, 5.003015015288728], [2.3749614743314256, 4.311350531411304], [2.8436221072732955, 3.913391091089852], [3.061319625750532, 3.894139119946398], [3.639845305129646, 4.098067164271942], [3.7069116757060363, 4.446540985791138]]);
	}
	linear_extrude(height = 0.8315310766) {
		polygon(points = [[8.274786532262272, 2.5693721693289238], [7.533823091637172, 2.3176205026737104], [7.571704487878197, 2.086215700150886], [8.198977996295962, 1.6346707050878093], [8.695080703118393, 1.9485328280726522], [8.60987494052295, 2.4345663131279363], [8.432514150443025, 2.587848994707222]]);
	}
	linear_extrude(height = 0.6417890489) {
		polygon(points = [[7.571704487878197, 2.086215700150886], [7.213141983106915, 1.5749975004112087], [6.448280652927108, 1.5043920110665687], [6.2566629280052934, 2.156222157975948], [7.30163505766491, 2.5933482902722407], [7.533823091637172, 2.3176205026737104]]);
	}
	linear_extrude(height = 1.2996747332) {
		polygon(points = [[8.274786532262272, 2.5693721693289238], [7.6734585314556805, 3.3267304223448124], [7.287295208785353, 3.0566480838548062], [7.30163505766491, 2.5933482902722407], [7.533823091637172, 2.3176205026737104]]);
	}
	linear_extrude(height = 0.7509996370) {
		polygon(points = [[8.198977996295962, 1.6346707050878093], [8.13842979269645, 0.9342490038638787], [7.628245715789428, 0.8027379792219456], [7.213141983106915, 1.5749975004112087], [7.571704487878197, 2.086215700150886]]);
	}
	linear_extrude(height = 1.1118418921) {
		polygon(points = [[8.695080703118393, 1.9485328280726522], [9.72469964757405, 1.5018437601002252], [8.719010480626224, 0.5875341516711872], [8.13842979269645, 0.9342490038638787], [8.198977996295962, 1.6346707050878093]]);
	}
	linear_extrude(height = 0.9693437769) {
		polygon(points = [[8.60987494052295, 2.4345663131279363], [9.161927699670002, 2.7291942580444974], [10.268617986667724, 1.8043754791808655], [10.38734496603068, 1.6892251850085935], [10.07504885882976, 1.5802160185728964], [9.72469964757405, 1.5018437601002252], [8.695080703118393, 1.9485328280726522]]);
	}
	linear_extrude(height = 1.0218017994) {
		polygon(points = [[8.432514150443025, 2.587848994707222], [8.50238047138886, 3.9513478735986602], [8.935185798514265, 4.051981406033719], [9.171512558102354, 3.9774851898049963], [9.198079960244527, 3.6214016987059208], [9.161927699670002, 2.7291942580444974], [8.60987494052295, 2.4345663131279363]]);
	}
	linear_extrude(height = 0.5810213279) {
		polygon(points = [[8.274786532262272, 2.5693721693289238], [7.6734585314556805, 3.3267304223448124], [8.228864949270841, 3.8495632479881503], [8.47780595906569, 3.9537601954851347], [8.50238047138886, 3.9513478735986602], [8.432514150443025, 2.587848994707222]]);
	}
	linear_extrude(height = 0.7318798674) {
		polygon(points = [[9.80894948984608, 6.199848219508854], [9.25820984755304, 6.087639492602099], [9.466763623633597, 5.315276956605837], [9.740557132701532, 5.091450051677282], [11.170435452194088, 6.270945471885839]]);
	}
	linear_extrude(height = 1.1714885641) {
		polygon(points = [[9.183157013279343, 7.788295380458997], [8.97833610370349, 7.753496623542178], [8.582136275058973, 6.638462447827329], [8.670393296314408, 6.1298575254345815], [9.25820984755304, 6.087639492602099], [9.80894948984608, 6.199848219508854]]);
	}
	linear_extrude(height = 0.5403166402) {
		polygon(points = [[9.183157013279343, 7.788295380458997], [8.97833610370349, 7.753496623542178], [8.873234574003002, 7.830445509345957], [8.394386654853978, 8.773096387542916], [8.857836612533033, 9.108798060160106], [9.77419760081811, 7.983175804180323]]);
	}
	linear_extrude(height = 0.8125818998) {
		polygon(points = [[6.8984177660920665, 7.50564891383598], [7.144063048297994, 7.509822113756026], [7.560415924733703, 7.703830091011053], [8.24001307152784, 8.818713545133486], [8.012624913158977, 8.981102916556106], [6.7899731918956485, 8.847864083116853], [6.311180995702708, 7.774052192137752], [6.520500742956351, 7.583338084947014], [6.815603720118346, 7.509704105813426]]);
	}
	linear_extrude(height = 1.3366005515) {
		polygon(points = [[7.3298205143458555, 5.80256529147597], [7.758712662694404, 5.556356222412511], [8.273564546129847, 5.939536329922038], [8.22902889154062, 5.9717544654095205], [7.390212009167904, 6.468829490938335], [7.213971143321778, 6.08625149303611]]);
	}
	linear_extrude(height = 1.3328673110) {
		polygon(points = [[8.22902889154062, 5.9717544654095205], [6.8984177660920665, 7.50564891383598], [7.144063048297994, 7.509822113756026], [8.582136275058973, 6.638462447827329], [8.670393296314408, 6.1298575254345815], [8.59736091351144, 6.0532273617270755], [8.273564546129847, 5.939536329922038]]);
	}
	linear_extrude(height = 0.6218477213) {
		polygon(points = [[7.758712662694404, 5.556356222412511], [7.592463884090238, 5.10790391416924], [8.47780595906569, 3.9537601954851347], [8.50238047138886, 3.9513478735986602], [8.935185798514265, 4.051981406033719], [8.923091685732098, 4.369688944027554], [8.59736091351144, 6.0532273617270755], [8.273564546129847, 5.939536329922038]]);
	}
	linear_extrude(height = 0.7405459690) {
		polygon(points = [[7.390212009167904, 6.468829490938335], [6.815603720118346, 7.509704105813426], [6.8984177660920665, 7.50564891383598], [8.22902889154062, 5.9717544654095205]]);
	}
	linear_extrude(height = 1.3820234590) {
		polygon(points = [[7.3298205143458555, 5.80256529147597], [6.441136421340248, 5.746978896450047], [6.2753785150804635, 5.198253861570346], [6.3675813347073404, 5.070045723588043], [7.319466045582692, 4.991339841243219], [7.592463884090238, 5.10790391416924], [7.758712662694404, 5.556356222412511]]);
	}
	linear_extrude(height = 0.9208399529) {
		polygon(points = [[7.213971143321778, 6.08625149303611], [6.518139045835942, 6.626953677977729], [6.520500742956351, 7.583338084947014], [6.815603720118346, 7.509704105813426], [7.390212009167904, 6.468829490938335]]);
	}
	linear_extrude(height = 1.1087940408) {
		polygon(points = [[7.3298205143458555, 5.80256529147597], [6.441136421340248, 5.746978896450047], [6.384299952087201, 6.100146314630701], [6.518139045835942, 6.626953677977729], [7.213971143321778, 6.08625149303611]]);
	}
}
